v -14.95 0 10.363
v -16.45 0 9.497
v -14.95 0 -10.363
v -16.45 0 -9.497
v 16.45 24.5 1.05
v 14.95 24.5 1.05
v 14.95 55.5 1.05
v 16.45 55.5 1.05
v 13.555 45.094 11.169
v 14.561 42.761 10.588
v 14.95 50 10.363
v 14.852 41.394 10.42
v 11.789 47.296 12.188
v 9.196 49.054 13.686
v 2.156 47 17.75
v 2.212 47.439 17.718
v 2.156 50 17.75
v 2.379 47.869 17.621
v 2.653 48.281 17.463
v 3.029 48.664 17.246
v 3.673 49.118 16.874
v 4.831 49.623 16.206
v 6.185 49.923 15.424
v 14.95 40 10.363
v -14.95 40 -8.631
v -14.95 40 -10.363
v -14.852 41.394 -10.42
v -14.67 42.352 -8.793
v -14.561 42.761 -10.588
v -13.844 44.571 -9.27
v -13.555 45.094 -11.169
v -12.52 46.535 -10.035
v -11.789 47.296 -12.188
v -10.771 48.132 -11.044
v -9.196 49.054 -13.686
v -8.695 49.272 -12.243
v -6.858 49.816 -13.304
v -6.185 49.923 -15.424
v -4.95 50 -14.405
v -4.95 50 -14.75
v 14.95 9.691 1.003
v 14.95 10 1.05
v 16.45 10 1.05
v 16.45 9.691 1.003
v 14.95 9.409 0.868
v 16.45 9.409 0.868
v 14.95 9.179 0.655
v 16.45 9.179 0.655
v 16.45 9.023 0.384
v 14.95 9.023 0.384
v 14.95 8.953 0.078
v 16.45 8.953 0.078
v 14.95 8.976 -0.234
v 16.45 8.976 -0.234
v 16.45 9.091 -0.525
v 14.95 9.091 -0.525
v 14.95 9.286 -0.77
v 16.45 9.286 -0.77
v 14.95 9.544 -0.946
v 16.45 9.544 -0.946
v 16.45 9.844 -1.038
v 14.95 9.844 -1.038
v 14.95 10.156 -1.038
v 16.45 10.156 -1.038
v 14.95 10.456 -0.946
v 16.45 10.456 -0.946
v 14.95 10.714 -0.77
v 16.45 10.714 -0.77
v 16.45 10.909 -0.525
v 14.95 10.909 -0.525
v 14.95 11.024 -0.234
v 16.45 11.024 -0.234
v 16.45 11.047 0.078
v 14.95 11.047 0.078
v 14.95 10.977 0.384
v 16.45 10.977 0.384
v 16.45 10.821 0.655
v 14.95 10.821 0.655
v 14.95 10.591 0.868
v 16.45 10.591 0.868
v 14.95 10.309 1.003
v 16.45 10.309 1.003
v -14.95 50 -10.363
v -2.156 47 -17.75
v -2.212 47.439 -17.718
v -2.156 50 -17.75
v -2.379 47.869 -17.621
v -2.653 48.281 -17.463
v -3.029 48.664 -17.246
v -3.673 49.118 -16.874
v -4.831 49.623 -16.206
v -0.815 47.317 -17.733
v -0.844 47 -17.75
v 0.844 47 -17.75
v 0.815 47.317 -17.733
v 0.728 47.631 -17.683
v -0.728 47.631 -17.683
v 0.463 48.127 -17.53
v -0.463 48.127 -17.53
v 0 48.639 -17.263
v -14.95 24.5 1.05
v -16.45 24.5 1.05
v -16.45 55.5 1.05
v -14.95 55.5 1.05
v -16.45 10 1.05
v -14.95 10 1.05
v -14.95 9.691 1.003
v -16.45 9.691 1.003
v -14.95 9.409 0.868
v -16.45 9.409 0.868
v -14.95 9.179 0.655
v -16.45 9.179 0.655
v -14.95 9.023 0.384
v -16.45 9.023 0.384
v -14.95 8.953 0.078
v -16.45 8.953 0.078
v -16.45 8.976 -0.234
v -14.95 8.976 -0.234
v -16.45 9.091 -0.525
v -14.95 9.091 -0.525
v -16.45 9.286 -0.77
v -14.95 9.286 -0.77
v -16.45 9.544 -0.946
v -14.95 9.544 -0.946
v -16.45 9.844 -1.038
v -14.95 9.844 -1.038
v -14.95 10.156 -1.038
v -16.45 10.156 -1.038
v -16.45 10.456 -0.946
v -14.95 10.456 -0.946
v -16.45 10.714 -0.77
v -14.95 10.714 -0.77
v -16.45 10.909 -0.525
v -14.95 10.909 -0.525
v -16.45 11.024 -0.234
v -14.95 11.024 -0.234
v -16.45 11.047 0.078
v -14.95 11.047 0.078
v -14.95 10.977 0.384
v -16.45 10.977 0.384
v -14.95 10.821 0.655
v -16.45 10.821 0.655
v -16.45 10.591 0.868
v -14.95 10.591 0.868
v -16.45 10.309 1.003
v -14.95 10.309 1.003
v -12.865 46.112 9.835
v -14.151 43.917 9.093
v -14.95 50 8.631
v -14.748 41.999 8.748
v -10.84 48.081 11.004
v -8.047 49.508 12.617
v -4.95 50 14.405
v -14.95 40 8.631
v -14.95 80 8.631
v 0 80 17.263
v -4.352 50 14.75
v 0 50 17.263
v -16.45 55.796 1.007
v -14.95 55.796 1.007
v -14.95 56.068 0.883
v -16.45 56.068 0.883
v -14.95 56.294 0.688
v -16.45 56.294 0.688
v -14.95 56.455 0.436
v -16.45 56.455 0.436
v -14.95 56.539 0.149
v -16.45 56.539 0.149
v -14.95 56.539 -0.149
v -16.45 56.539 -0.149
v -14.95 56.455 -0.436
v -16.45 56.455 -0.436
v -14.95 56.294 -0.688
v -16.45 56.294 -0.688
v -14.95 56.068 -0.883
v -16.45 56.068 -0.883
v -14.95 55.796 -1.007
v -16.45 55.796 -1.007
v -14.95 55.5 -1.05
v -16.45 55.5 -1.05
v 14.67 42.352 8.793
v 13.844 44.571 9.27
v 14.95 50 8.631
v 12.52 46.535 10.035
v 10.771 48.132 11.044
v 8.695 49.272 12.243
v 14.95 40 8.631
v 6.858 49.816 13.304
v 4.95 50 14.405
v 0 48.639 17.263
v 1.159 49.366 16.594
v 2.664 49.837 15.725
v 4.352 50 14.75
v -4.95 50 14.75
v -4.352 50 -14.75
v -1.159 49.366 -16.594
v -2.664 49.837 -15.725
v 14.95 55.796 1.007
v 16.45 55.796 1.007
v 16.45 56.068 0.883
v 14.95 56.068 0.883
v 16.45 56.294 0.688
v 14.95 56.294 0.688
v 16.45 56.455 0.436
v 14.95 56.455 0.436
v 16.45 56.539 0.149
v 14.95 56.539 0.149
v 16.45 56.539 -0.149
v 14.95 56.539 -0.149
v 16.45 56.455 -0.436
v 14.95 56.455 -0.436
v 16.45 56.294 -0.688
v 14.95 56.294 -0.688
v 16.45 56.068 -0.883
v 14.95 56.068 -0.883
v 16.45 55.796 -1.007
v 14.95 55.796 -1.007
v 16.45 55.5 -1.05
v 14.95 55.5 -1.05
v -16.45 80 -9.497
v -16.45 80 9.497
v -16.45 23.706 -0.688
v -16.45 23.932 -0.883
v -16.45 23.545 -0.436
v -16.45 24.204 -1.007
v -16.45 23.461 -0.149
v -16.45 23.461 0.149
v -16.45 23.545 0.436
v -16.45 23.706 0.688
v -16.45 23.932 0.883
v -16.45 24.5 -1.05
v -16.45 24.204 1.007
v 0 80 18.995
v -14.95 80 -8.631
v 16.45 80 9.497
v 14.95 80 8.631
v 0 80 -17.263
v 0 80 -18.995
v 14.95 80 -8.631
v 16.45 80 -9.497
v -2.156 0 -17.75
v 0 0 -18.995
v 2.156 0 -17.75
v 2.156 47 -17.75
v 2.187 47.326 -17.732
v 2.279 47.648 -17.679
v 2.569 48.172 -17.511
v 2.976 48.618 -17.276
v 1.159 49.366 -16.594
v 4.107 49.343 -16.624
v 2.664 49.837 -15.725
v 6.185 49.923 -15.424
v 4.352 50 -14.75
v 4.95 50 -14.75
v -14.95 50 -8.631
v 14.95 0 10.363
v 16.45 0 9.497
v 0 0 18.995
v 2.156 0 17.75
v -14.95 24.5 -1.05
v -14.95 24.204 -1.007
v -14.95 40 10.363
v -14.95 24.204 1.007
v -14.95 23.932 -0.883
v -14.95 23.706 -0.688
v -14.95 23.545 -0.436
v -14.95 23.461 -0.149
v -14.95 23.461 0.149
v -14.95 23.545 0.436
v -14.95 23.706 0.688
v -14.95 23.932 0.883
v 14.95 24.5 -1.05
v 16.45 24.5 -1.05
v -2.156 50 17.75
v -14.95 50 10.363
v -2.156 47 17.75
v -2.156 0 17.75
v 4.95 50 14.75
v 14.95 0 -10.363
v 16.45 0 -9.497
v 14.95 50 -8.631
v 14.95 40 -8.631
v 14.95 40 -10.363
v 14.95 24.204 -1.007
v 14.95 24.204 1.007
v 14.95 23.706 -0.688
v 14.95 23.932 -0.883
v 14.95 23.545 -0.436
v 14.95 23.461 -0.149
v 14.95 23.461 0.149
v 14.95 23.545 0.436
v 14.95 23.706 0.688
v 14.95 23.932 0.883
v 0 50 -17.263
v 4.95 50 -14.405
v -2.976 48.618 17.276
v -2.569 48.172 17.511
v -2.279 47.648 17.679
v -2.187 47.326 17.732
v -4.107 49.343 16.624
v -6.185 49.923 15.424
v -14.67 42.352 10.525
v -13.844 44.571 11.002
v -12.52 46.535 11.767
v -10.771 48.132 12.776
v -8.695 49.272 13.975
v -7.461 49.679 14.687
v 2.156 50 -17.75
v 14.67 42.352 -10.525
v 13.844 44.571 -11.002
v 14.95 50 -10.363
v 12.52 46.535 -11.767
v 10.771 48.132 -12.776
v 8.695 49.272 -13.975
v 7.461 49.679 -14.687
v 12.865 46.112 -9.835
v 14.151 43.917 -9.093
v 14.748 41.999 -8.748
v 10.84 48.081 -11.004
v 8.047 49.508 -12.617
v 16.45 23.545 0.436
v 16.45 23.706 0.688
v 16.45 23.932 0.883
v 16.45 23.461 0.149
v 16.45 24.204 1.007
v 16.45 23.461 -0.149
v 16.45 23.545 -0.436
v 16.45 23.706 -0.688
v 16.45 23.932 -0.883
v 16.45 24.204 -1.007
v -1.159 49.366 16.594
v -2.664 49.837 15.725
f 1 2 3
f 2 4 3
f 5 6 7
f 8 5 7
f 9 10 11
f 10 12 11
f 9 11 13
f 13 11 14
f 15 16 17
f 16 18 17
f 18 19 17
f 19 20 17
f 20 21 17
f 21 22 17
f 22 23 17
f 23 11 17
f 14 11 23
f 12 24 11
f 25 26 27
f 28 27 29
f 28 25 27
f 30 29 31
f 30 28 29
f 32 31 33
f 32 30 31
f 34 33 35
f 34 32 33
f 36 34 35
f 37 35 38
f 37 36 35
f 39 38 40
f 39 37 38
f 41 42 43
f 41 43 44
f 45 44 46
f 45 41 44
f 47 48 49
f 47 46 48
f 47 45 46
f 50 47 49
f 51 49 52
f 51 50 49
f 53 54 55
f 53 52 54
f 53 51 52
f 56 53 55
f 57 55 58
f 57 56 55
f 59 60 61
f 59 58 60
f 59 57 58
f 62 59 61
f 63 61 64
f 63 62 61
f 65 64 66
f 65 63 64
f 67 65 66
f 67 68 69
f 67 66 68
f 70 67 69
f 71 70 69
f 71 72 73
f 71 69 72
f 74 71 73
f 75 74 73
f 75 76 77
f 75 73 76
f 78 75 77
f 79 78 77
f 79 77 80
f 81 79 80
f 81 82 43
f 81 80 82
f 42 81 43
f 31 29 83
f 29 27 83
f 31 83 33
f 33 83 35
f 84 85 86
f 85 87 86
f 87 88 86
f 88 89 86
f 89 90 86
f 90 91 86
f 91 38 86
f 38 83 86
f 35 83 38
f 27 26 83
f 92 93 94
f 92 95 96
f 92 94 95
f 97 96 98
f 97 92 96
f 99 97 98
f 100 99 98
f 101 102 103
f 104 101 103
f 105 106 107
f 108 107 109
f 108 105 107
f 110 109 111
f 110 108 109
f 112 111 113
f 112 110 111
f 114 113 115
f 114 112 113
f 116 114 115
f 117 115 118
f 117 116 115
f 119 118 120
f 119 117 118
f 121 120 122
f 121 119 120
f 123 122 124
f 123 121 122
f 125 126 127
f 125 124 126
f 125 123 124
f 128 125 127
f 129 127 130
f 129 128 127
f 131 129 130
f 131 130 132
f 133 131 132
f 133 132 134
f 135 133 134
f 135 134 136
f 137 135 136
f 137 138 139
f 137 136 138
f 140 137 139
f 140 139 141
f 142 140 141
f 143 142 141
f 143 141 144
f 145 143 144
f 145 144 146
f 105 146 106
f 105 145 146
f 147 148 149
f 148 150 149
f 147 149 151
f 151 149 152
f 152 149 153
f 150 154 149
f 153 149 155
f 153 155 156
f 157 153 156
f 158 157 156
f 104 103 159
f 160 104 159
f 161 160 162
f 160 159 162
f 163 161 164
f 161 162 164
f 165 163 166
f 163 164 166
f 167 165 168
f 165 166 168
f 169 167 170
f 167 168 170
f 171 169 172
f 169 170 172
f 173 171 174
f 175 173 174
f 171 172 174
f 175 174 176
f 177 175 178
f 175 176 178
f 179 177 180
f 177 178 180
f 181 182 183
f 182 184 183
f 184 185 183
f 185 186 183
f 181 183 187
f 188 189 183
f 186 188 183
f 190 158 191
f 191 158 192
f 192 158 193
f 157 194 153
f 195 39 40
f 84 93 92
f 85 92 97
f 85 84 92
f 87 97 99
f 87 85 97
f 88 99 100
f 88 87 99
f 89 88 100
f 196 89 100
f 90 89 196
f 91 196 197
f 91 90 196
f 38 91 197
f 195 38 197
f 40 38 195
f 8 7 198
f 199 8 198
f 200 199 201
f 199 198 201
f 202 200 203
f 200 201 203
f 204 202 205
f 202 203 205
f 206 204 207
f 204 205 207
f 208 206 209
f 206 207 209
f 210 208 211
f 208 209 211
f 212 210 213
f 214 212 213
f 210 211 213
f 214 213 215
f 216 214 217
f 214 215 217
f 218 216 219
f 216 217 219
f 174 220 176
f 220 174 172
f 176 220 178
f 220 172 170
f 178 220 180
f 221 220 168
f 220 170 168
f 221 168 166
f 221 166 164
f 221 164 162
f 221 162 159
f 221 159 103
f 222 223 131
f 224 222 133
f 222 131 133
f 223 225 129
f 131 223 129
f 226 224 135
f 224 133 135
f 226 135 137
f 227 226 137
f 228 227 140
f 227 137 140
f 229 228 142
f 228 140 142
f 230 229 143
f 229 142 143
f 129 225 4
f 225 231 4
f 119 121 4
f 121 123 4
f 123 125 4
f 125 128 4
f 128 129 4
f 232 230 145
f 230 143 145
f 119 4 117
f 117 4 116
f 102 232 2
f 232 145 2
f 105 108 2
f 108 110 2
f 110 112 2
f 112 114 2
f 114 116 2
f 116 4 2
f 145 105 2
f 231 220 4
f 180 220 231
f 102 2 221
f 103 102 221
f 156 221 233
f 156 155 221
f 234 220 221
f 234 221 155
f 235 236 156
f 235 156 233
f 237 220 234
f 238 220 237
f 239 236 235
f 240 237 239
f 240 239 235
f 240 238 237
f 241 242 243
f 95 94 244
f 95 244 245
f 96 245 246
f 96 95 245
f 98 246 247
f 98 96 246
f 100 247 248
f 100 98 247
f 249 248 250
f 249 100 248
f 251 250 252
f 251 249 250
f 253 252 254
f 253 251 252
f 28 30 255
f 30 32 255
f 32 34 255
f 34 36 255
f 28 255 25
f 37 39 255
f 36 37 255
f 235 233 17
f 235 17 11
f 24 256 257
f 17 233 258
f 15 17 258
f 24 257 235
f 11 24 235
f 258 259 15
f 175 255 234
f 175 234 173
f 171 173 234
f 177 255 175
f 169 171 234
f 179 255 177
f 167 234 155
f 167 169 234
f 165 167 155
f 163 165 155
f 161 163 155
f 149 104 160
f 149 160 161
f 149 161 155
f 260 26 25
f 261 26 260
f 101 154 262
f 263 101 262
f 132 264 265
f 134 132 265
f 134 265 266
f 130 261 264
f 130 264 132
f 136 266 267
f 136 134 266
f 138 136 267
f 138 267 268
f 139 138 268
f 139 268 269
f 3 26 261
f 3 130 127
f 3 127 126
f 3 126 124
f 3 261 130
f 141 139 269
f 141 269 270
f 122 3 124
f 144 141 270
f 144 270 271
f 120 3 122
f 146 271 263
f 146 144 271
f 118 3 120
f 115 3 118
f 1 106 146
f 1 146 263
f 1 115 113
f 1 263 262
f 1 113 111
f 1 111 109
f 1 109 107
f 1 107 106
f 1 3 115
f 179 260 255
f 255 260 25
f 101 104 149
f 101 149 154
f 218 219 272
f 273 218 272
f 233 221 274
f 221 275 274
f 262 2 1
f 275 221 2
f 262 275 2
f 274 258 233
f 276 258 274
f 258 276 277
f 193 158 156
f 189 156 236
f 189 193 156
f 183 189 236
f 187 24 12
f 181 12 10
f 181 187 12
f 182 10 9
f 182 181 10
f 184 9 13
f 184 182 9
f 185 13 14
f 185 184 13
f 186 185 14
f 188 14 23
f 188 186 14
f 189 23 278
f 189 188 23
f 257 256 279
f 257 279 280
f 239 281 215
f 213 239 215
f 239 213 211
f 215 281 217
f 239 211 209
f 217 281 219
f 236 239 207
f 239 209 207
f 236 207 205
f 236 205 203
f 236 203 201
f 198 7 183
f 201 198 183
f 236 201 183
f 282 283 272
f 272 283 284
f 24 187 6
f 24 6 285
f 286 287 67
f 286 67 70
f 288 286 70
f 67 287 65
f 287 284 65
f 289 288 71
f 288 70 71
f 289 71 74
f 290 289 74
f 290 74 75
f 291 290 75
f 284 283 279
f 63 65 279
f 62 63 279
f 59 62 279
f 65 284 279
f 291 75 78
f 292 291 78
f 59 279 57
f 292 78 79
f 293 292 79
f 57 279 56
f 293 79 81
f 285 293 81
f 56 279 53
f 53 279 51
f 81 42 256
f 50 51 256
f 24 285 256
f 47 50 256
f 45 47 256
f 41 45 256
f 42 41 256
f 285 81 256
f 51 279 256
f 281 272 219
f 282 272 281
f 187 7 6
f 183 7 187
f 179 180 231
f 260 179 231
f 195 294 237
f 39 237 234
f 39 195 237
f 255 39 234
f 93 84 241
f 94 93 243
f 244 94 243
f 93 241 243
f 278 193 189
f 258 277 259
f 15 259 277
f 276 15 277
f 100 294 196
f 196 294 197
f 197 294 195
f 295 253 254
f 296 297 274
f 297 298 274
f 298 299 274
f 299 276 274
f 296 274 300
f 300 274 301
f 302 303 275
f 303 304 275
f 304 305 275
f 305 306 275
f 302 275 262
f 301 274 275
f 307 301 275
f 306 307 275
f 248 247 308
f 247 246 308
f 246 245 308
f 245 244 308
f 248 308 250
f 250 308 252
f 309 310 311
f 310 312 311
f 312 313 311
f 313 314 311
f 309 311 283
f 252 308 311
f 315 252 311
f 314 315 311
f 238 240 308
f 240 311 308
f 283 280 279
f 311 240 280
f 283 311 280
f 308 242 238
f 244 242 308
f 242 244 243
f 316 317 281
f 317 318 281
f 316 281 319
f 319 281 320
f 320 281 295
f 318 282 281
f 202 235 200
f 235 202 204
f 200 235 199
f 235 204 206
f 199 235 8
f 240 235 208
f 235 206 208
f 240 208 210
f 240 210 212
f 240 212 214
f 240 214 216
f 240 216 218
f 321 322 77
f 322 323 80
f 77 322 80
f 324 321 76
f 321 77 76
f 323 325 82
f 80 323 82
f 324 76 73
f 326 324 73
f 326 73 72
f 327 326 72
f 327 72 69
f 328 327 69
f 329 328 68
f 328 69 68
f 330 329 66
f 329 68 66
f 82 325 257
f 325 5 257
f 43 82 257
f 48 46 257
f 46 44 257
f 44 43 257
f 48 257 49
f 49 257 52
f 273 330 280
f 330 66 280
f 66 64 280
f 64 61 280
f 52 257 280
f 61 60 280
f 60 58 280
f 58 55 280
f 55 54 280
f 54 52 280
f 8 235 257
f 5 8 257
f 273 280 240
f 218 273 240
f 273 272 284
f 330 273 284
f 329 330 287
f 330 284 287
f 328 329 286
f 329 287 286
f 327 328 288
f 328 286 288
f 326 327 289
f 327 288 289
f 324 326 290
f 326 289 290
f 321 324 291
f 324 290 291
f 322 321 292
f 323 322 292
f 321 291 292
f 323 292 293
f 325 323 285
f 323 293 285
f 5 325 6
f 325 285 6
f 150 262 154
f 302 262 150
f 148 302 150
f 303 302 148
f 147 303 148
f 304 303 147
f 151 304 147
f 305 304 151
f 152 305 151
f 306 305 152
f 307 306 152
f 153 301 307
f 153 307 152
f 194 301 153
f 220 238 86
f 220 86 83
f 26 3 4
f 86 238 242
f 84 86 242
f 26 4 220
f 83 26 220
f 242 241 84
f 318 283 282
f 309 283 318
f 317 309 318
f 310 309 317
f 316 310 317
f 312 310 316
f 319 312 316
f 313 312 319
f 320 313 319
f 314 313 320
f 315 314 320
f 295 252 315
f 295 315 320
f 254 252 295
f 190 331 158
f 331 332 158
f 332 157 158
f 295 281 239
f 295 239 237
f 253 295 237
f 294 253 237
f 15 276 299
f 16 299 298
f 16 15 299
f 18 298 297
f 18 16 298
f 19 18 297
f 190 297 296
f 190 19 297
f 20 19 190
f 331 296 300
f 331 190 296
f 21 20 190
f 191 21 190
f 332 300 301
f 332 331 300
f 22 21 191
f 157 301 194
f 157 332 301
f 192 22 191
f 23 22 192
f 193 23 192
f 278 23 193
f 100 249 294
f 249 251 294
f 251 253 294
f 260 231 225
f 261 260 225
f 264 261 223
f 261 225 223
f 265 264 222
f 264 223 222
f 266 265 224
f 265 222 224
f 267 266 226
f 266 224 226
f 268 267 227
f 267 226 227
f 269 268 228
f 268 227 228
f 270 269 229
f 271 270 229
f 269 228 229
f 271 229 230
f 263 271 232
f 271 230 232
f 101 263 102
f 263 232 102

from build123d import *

# Parameters (mm, degrees)
BOSS_EXTRUDE1_DEPTH     = 80
CUT_EXTRUDE1_DEPTH      = 89.561918076
CUT_EXTRUDE1_DEPTH_BACK = 89.561918076
SKETCH3_R               = 1.05
CUT_EXTRUDE2_DEPTH      = 89.561918076
CUT_EXTRUDE3_DEPTH      = 50
FILLET2_R               = 10
FILLET3_R               = 3


with BuildPart() as part:
    # Sketch1 → Boss-Extrude1 (new body)
    with BuildSketch(Plane(origin=(0, 0, 0), x_dir=(1, 0, 0), z_dir=(0, 1, 0))):
        Polygon((16.45, -9.497411928), (16.45, 9.497411928), (0, 18.994823856), (-16.45, 9.497411928), (-16.45, -9.497411928), (0, -18.994823856), align=None)
        Polygon((14.95, 8.631386524), (0, 17.262773049), (-14.95, 8.631386524), (-14.95, -8.631386524), (0, -17.262773049), (14.95, -8.631386524), align=None, mode=Mode.SUBTRACT)
    extrude(amount=BOSS_EXTRUDE1_DEPTH)

    # Sketch2 → Cut-Extrude1 (cut, two sides: drawn at the far end of the back side and taken through both)
    with BuildSketch(Plane(origin=(-16.45, 0, 0), x_dir=(0, 0, -1), z_dir=(1, 0, 0)).offset(-CUT_EXTRUDE1_DEPTH_BACK)):
        with BuildLine():
            Line((1.05, 55.5), (1.05, 24.5))
            ThreePointArc((1.05, 24.5), (0, 23.45), (-1.05, 24.5))
            Line((-1.05, 24.5), (-1.05, 55.5))
            ThreePointArc((-1.05, 55.5), (0, 56.55), (1.05, 55.5))
        make_face()
    extrude(amount=CUT_EXTRUDE1_DEPTH + CUT_EXTRUDE1_DEPTH_BACK, mode=Mode.SUBTRACT)

    # Sketch3 → Cut-Extrude2 (cut, through all)
    with BuildSketch(Plane(origin=(-16.45, 0, 0), x_dir=(0, 0, -1), z_dir=(1, 0, 0))):
        with Locations(Location((0, 10, 0), (0, 0, 180))):
            Circle(SKETCH3_R)
    extrude(amount=CUT_EXTRUDE2_DEPTH, mode=Mode.SUBTRACT)

    # Sketch5 → Cut-Extrude3 (cut)
    with BuildSketch(Plane.XZ):
        Polygon((-14.95, 10.363437332), (-14.95, 8.631386524), (0, 17.262773049), (14.95, 8.631386524), (14.95, 10.363437332), (2.156098166, 17.75), (-2.156098166, 17.75), align=None)
        Polygon((-14.95, -10.363437332), (-2.156098166, -17.75), (2.156098166, -17.75), (14.95, -10.363437332), (14.95, -8.631386524), (0, -17.262773049), (-14.95, -8.631386524), align=None)
    extrude(amount=-CUT_EXTRUDE3_DEPTH, mode=Mode.SUBTRACT)

    # Fillet2
    # the kernel refuses this fillet: 10 mm, written as the material it adds along each edge
    with BuildSketch(Plane(origin=(14.95, 50, -16.368613476), x_dir=(0, -1, 0), z_dir=(0, 0, 1))) as fillet2_piece_1_section:
        with BuildLine():
            CenterArc((FILLET2_R, -FILLET2_R), FILLET2_R, 90, 90)
            Line((0, -FILLET2_R), (0, 0))
            Line((0, 0), (FILLET2_R, 0))
        make_face()
    fillet2_piece_1 = extrude(amount=51.732050808, mode=Mode.PRIVATE)
    fillet2_piece_1 = split(fillet2_piece_1, bisect_by=Plane(origin=(12.341320611, 47.766320611, -10.137508272), z_dir=(0.5000000000000004, 0, -0.8660254037844385)), keep=Keep.TOP, mode=Mode.PRIVATE)
    fillet2_piece_1 = split(fillet2_piece_1, bisect_by=Plane(origin=(13.091320611, 47.766320611, -11.436546378), z_dir=(-0.5000000000000003, 0, 0.8660254037844385)), keep=Keep.TOP, mode=Mode.PRIVATE)
    add(fillet2_piece_1)
    with BuildSketch(Plane(origin=(14.95, 50, -16.368613476), x_dir=(0, -1, 0), z_dir=(0, 0, 1))) as fillet2_piece_2_section:
        with BuildLine():
            CenterArc((FILLET2_R, -FILLET2_R), FILLET2_R, 90, 90)
            Line((0, -FILLET2_R), (0, 0))
            Line((0, 0), (FILLET2_R, 0))
        make_face()
    fillet2_piece_2 = extrude(amount=51.732050808, mode=Mode.PRIVATE)
    fillet2_piece_2 = split(fillet2_piece_2, bisect_by=Plane(origin=(12.341320611, 47.766320611, 10.137508272), z_dir=(0.49999999999999967, 0, 0.8660254037844388)), keep=Keep.TOP, mode=Mode.PRIVATE)
    fillet2_piece_2 = split(fillet2_piece_2, bisect_by=Plane(origin=(13.091320611, 47.766320611, 11.436546378), z_dir=(-0.4999999999999997, 0, -0.8660254037844388)), keep=Keep.TOP, mode=Mode.PRIVATE)
    add(fillet2_piece_2)
    with BuildSketch(Plane(origin=(-14.95, 50, 35.363437332), x_dir=(1, 0, 0), z_dir=(0, 0, -1))) as fillet2_piece_3_section:
        with BuildLine():
            CenterArc((FILLET2_R, FILLET2_R), FILLET2_R, 180, 90)
            Line((0, FILLET2_R), (0, 0))
            Line((0, 0), (FILLET2_R, 0))
        make_face()
    fillet2_piece_3 = extrude(amount=51.732050808, mode=Mode.PRIVATE)
    fillet2_piece_3 = split(fillet2_piece_3, bisect_by=Plane(origin=(-13.091320611, 47.766320611, 11.436546378), z_dir=(0.5000000000000001, 0, -0.8660254037844387)), keep=Keep.TOP, mode=Mode.PRIVATE)
    fillet2_piece_3 = split(fillet2_piece_3, bisect_by=Plane(origin=(-12.341320611, 47.766320611, 10.137508272), z_dir=(-0.5000000000000002, 0, 0.8660254037844386)), keep=Keep.TOP, mode=Mode.PRIVATE)
    add(fillet2_piece_3)
    with BuildSketch(Plane(origin=(-14.95, 50, 35.363437332), x_dir=(1, 0, 0), z_dir=(0, 0, -1))) as fillet2_piece_4_section:
        with BuildLine():
            CenterArc((FILLET2_R, FILLET2_R), FILLET2_R, 180, 90)
            Line((0, FILLET2_R), (0, 0))
            Line((0, 0), (FILLET2_R, 0))
        make_face()
    fillet2_piece_4 = extrude(amount=51.732050808, mode=Mode.PRIVATE)
    fillet2_piece_4 = split(fillet2_piece_4, bisect_by=Plane(origin=(-13.091320611, 47.766320611, -11.436546378), z_dir=(0.49999999999999956, 0, 0.8660254037844389)), keep=Keep.TOP, mode=Mode.PRIVATE)
    fillet2_piece_4 = split(fillet2_piece_4, bisect_by=Plane(origin=(-12.341320611, 47.766320611, -10.137508272), z_dir=(-0.49999999999999956, 0, -0.8660254037844389)), keep=Keep.TOP, mode=Mode.PRIVATE)
    add(fillet2_piece_4)
    with BuildSketch(Plane(origin=(14.95, 50, -35.363437332), x_dir=(0, -1, 0), z_dir=(0, 0, 1))) as fillet2_piece_5_section:
        with BuildLine():
            CenterArc((FILLET2_R, -FILLET2_R), FILLET2_R, 90, 90)
            Line((0, -FILLET2_R), (0, 0))
            Line((0, 0), (FILLET2_R, 0))
        make_face()
    fillet2_piece_5 = extrude(amount=51.732050808, mode=Mode.PRIVATE)
    fillet2_piece_5 = split(fillet2_piece_5, bisect_by=Plane(origin=(12.341320611, 47.766320611, -10.137508272), z_dir=(0.5000000000000004, 0, -0.8660254037844385)), keep=Keep.TOP, mode=Mode.PRIVATE)
    fillet2_piece_5 = split(fillet2_piece_5, bisect_by=Plane(origin=(13.091320611, 47.766320611, -11.436546378), z_dir=(-0.5000000000000003, 0, 0.8660254037844385)), keep=Keep.TOP, mode=Mode.PRIVATE)
    add(fillet2_piece_5)
    with BuildSketch(Plane(origin=(14.95, 50, -35.363437332), x_dir=(0, -1, 0), z_dir=(0, 0, 1))) as fillet2_piece_6_section:
        with BuildLine():
            CenterArc((FILLET2_R, -FILLET2_R), FILLET2_R, 90, 90)
            Line((0, -FILLET2_R), (0, 0))
            Line((0, 0), (FILLET2_R, 0))
        make_face()
    fillet2_piece_6 = extrude(amount=51.732050808, mode=Mode.PRIVATE)
    fillet2_piece_6 = split(fillet2_piece_6, bisect_by=Plane(origin=(12.341320611, 47.766320611, 10.137508272), z_dir=(0.49999999999999967, 0, 0.8660254037844388)), keep=Keep.TOP, mode=Mode.PRIVATE)
    fillet2_piece_6 = split(fillet2_piece_6, bisect_by=Plane(origin=(13.091320611, 47.766320611, 11.436546378), z_dir=(-0.4999999999999997, 0, -0.8660254037844388)), keep=Keep.TOP, mode=Mode.PRIVATE)
    add(fillet2_piece_6)
    with BuildSketch(Plane(origin=(-14.95, 50, 16.368613476), x_dir=(0, -1, 0), z_dir=(0, 0, -1))) as fillet2_piece_7_section:
        with BuildLine():
            CenterArc((FILLET2_R, -FILLET2_R), FILLET2_R, 90, 90)
            Line((0, -FILLET2_R), (0, 0))
            Line((0, 0), (FILLET2_R, 0))
        make_face()
    fillet2_piece_7 = extrude(amount=51.732050808, mode=Mode.PRIVATE)
    fillet2_piece_7 = split(fillet2_piece_7, bisect_by=Plane(origin=(-13.091320611, 47.766320611, 11.436546378), z_dir=(0.5000000000000001, 0, -0.8660254037844387)), keep=Keep.TOP, mode=Mode.PRIVATE)
    fillet2_piece_7 = split(fillet2_piece_7, bisect_by=Plane(origin=(-12.341320611, 47.766320611, 10.137508272), z_dir=(-0.5000000000000002, 0, 0.8660254037844386)), keep=Keep.TOP, mode=Mode.PRIVATE)
    add(fillet2_piece_7)
    with BuildSketch(Plane(origin=(-14.95, 50, 16.368613476), x_dir=(0, -1, 0), z_dir=(0, 0, -1))) as fillet2_piece_8_section:
        with BuildLine():
            CenterArc((FILLET2_R, -FILLET2_R), FILLET2_R, 90, 90)
            Line((0, -FILLET2_R), (0, 0))
            Line((0, 0), (FILLET2_R, 0))
        make_face()
    fillet2_piece_8 = extrude(amount=51.732050808, mode=Mode.PRIVATE)
    fillet2_piece_8 = split(fillet2_piece_8, bisect_by=Plane(origin=(-13.091320611, 47.766320611, -11.436546378), z_dir=(0.49999999999999956, 0, 0.8660254037844389)), keep=Keep.TOP, mode=Mode.PRIVATE)
    fillet2_piece_8 = split(fillet2_piece_8, bisect_by=Plane(origin=(-12.341320611, 47.766320611, -10.137508272), z_dir=(-0.49999999999999956, 0, -0.8660254037844389)), keep=Keep.TOP, mode=Mode.PRIVATE)
    add(fillet2_piece_8)

    # Fillet3
    # the kernel refuses this fillet: 3 mm, written as the material it adds along each edge
    with BuildSketch(Plane(origin=(-9.656098166, 50, -17.75), x_dir=(0, -1, 0), z_dir=(1, 0, 0))) as fillet3_piece_1_section:
        with BuildLine():
            CenterArc((FILLET3_R, -FILLET3_R), FILLET3_R, 90, 90)
            Line((0, -FILLET3_R), (0, 0))
            Line((0, 0), (FILLET3_R, 0))
        make_face()
    fillet3_piece_1 = extrude(amount=19.312196331, mode=Mode.PRIVATE)
    fillet3_piece_1 = split(fillet3_piece_1, bisect_by=Plane(origin=(-1.532605741, 49.425378902, -18.147623386), z_dir=(-0.50000000000019, 0, 0.866025403784329)), keep=Keep.TOP, mode=Mode.PRIVATE)
    fillet3_piece_1 = split(fillet3_piece_1, bisect_by=Plane(origin=(-2.557365025, 49.425378902, -17.51832847), z_dir=(0.50000000000019, 0, 0.866025403784329)), keep=Keep.TOP, mode=Mode.PRIVATE)
    fillet3_piece_1 = split(fillet3_piece_1, bisect_by=Plane(origin=(-1.807365025, 49.425378902, -16.219290365), z_dir=(-0.50000000000019, 0, -0.866025403784329)), keep=Keep.TOP, mode=Mode.PRIVATE)
    add(fillet3_piece_1)
    with BuildSketch(Plane(origin=(-9.656098166, 50, -17.75), x_dir=(0, -1, 0), z_dir=(1, 0, 0))) as fillet3_piece_2_section:
        with BuildLine():
            CenterArc((FILLET3_R, -FILLET3_R), FILLET3_R, 90, 90)
            Line((0, -FILLET3_R), (0, 0))
            Line((0, 0), (FILLET3_R, 0))
        make_face()
    fillet3_piece_2 = extrude(amount=19.312196331, mode=Mode.PRIVATE)
    fillet3_piece_2 = split(fillet3_piece_2, bisect_by=Plane(origin=(-0.169131564, 48.834693799, -17.360421203), z_dir=(0.50000000000019, 0, -0.866025403784329)), keep=Keep.TOP, mode=Mode.PRIVATE)
    fillet3_piece_2 = split(fillet3_piece_2, bisect_by=Plane(origin=(0.169131564, 48.834693799, -17.360421203), z_dir=(-0.50000000000019, 0, -0.866025403784329)), keep=Keep.TOP, mode=Mode.PRIVATE)
    add(fillet3_piece_2)
    with BuildSketch(Plane(origin=(-9.656098166, 50, -17.75), x_dir=(0, -1, 0), z_dir=(1, 0, 0))) as fillet3_piece_3_section:
        with BuildLine():
            CenterArc((FILLET3_R, -FILLET3_R), FILLET3_R, 90, 90)
            Line((0, -FILLET3_R), (0, 0))
            Line((0, 0), (FILLET3_R, 0))
        make_face()
    fillet3_piece_3 = extrude(amount=19.312196331, mode=Mode.PRIVATE)
    fillet3_piece_3 = split(fillet3_piece_3, bisect_by=Plane(origin=(1.807365025, 49.425378902, -16.219290365), z_dir=(0.50000000000019, 0, -0.866025403784329)), keep=Keep.TOP, mode=Mode.PRIVATE)
    fillet3_piece_3 = split(fillet3_piece_3, bisect_by=Plane(origin=(2.557365025, 49.425378902, -17.51832847), z_dir=(-0.50000000000019, 0, 0.866025403784329)), keep=Keep.TOP, mode=Mode.PRIVATE)
    fillet3_piece_3 = split(fillet3_piece_3, bisect_by=Plane(origin=(1.532605741, 49.425378902, -18.147623386), z_dir=(0.50000000000019, 0, 0.866025403784329)), keep=Keep.TOP, mode=Mode.PRIVATE)
    add(fillet3_piece_3)
    with BuildSketch(Plane(origin=(9.656098166, 50, 17.75), x_dir=(0, 0, -1), z_dir=(-1, 0, 0))) as fillet3_piece_4_section:
        with BuildLine():
            CenterArc((FILLET3_R, FILLET3_R), FILLET3_R, 180, 90)
            Line((0, FILLET3_R), (0, 0))
            Line((0, 0), (FILLET3_R, 0))
        make_face()
    fillet3_piece_4 = extrude(amount=19.312196331, mode=Mode.PRIVATE)
    fillet3_piece_4 = split(fillet3_piece_4, bisect_by=Plane(origin=(2.557365029, 49.425378904, 17.518328468), z_dir=(-0.50000000000019, 0, -0.866025403784329)), keep=Keep.TOP, mode=Mode.PRIVATE)
    fillet3_piece_4 = split(fillet3_piece_4, bisect_by=Plane(origin=(1.807365029, 49.425378904, 16.219290363), z_dir=(0.50000000000019, 0, 0.866025403784329)), keep=Keep.TOP, mode=Mode.PRIVATE)
    fillet3_piece_4 = split(fillet3_piece_4, bisect_by=Plane(origin=(1.532605746, 49.425378904, 18.147623389), z_dir=(0.50000000000019, 0, -0.866025403784329)), keep=Keep.TOP, mode=Mode.PRIVATE)
    add(fillet3_piece_4)
    with BuildSketch(Plane(origin=(9.656098166, 50, 17.75), x_dir=(0, 0, -1), z_dir=(-1, 0, 0))) as fillet3_piece_5_section:
        with BuildLine():
            CenterArc((FILLET3_R, FILLET3_R), FILLET3_R, 180, 90)
            Line((0, FILLET3_R), (0, 0))
            Line((0, 0), (FILLET3_R, 0))
        make_face()
    fillet3_piece_5 = extrude(amount=19.312196331, mode=Mode.PRIVATE)
    fillet3_piece_5 = split(fillet3_piece_5, bisect_by=Plane(origin=(-0.169131564, 48.8346938, 17.360421203), z_dir=(0.50000000000019, 0, 0.866025403784329)), keep=Keep.TOP, mode=Mode.PRIVATE)
    fillet3_piece_5 = split(fillet3_piece_5, bisect_by=Plane(origin=(0.169131564, 48.8346938, 17.360421203), z_dir=(-0.50000000000019, 0, 0.866025403784329)), keep=Keep.TOP, mode=Mode.PRIVATE)
    add(fillet3_piece_5)
    with BuildSketch(Plane(origin=(9.656098166, 50, 17.75), x_dir=(0, 0, -1), z_dir=(-1, 0, 0))) as fillet3_piece_6_section:
        with BuildLine():
            CenterArc((FILLET3_R, FILLET3_R), FILLET3_R, 180, 90)
            Line((0, FILLET3_R), (0, 0))
            Line((0, 0), (FILLET3_R, 0))
        make_face()
    fillet3_piece_6 = extrude(amount=19.312196331, mode=Mode.PRIVATE)
    fillet3_piece_6 = split(fillet3_piece_6, bisect_by=Plane(origin=(-2.557365029, 49.425378904, 17.518328468), z_dir=(0.50000000000019, 0, -0.866025403784329)), keep=Keep.TOP, mode=Mode.PRIVATE)
    fillet3_piece_6 = split(fillet3_piece_6, bisect_by=Plane(origin=(-1.532605746, 49.425378904, 18.147623389), z_dir=(-0.50000000000019, 0, -0.866025403784329)), keep=Keep.TOP, mode=Mode.PRIVATE)
    fillet3_piece_6 = split(fillet3_piece_6, bisect_by=Plane(origin=(-1.807365029, 49.425378904, 16.219290363), z_dir=(-0.50000000000019, 0, 0.866025403784329)), keep=Keep.TOP, mode=Mode.PRIVATE)
    add(fillet3_piece_6)


solid = part.part
